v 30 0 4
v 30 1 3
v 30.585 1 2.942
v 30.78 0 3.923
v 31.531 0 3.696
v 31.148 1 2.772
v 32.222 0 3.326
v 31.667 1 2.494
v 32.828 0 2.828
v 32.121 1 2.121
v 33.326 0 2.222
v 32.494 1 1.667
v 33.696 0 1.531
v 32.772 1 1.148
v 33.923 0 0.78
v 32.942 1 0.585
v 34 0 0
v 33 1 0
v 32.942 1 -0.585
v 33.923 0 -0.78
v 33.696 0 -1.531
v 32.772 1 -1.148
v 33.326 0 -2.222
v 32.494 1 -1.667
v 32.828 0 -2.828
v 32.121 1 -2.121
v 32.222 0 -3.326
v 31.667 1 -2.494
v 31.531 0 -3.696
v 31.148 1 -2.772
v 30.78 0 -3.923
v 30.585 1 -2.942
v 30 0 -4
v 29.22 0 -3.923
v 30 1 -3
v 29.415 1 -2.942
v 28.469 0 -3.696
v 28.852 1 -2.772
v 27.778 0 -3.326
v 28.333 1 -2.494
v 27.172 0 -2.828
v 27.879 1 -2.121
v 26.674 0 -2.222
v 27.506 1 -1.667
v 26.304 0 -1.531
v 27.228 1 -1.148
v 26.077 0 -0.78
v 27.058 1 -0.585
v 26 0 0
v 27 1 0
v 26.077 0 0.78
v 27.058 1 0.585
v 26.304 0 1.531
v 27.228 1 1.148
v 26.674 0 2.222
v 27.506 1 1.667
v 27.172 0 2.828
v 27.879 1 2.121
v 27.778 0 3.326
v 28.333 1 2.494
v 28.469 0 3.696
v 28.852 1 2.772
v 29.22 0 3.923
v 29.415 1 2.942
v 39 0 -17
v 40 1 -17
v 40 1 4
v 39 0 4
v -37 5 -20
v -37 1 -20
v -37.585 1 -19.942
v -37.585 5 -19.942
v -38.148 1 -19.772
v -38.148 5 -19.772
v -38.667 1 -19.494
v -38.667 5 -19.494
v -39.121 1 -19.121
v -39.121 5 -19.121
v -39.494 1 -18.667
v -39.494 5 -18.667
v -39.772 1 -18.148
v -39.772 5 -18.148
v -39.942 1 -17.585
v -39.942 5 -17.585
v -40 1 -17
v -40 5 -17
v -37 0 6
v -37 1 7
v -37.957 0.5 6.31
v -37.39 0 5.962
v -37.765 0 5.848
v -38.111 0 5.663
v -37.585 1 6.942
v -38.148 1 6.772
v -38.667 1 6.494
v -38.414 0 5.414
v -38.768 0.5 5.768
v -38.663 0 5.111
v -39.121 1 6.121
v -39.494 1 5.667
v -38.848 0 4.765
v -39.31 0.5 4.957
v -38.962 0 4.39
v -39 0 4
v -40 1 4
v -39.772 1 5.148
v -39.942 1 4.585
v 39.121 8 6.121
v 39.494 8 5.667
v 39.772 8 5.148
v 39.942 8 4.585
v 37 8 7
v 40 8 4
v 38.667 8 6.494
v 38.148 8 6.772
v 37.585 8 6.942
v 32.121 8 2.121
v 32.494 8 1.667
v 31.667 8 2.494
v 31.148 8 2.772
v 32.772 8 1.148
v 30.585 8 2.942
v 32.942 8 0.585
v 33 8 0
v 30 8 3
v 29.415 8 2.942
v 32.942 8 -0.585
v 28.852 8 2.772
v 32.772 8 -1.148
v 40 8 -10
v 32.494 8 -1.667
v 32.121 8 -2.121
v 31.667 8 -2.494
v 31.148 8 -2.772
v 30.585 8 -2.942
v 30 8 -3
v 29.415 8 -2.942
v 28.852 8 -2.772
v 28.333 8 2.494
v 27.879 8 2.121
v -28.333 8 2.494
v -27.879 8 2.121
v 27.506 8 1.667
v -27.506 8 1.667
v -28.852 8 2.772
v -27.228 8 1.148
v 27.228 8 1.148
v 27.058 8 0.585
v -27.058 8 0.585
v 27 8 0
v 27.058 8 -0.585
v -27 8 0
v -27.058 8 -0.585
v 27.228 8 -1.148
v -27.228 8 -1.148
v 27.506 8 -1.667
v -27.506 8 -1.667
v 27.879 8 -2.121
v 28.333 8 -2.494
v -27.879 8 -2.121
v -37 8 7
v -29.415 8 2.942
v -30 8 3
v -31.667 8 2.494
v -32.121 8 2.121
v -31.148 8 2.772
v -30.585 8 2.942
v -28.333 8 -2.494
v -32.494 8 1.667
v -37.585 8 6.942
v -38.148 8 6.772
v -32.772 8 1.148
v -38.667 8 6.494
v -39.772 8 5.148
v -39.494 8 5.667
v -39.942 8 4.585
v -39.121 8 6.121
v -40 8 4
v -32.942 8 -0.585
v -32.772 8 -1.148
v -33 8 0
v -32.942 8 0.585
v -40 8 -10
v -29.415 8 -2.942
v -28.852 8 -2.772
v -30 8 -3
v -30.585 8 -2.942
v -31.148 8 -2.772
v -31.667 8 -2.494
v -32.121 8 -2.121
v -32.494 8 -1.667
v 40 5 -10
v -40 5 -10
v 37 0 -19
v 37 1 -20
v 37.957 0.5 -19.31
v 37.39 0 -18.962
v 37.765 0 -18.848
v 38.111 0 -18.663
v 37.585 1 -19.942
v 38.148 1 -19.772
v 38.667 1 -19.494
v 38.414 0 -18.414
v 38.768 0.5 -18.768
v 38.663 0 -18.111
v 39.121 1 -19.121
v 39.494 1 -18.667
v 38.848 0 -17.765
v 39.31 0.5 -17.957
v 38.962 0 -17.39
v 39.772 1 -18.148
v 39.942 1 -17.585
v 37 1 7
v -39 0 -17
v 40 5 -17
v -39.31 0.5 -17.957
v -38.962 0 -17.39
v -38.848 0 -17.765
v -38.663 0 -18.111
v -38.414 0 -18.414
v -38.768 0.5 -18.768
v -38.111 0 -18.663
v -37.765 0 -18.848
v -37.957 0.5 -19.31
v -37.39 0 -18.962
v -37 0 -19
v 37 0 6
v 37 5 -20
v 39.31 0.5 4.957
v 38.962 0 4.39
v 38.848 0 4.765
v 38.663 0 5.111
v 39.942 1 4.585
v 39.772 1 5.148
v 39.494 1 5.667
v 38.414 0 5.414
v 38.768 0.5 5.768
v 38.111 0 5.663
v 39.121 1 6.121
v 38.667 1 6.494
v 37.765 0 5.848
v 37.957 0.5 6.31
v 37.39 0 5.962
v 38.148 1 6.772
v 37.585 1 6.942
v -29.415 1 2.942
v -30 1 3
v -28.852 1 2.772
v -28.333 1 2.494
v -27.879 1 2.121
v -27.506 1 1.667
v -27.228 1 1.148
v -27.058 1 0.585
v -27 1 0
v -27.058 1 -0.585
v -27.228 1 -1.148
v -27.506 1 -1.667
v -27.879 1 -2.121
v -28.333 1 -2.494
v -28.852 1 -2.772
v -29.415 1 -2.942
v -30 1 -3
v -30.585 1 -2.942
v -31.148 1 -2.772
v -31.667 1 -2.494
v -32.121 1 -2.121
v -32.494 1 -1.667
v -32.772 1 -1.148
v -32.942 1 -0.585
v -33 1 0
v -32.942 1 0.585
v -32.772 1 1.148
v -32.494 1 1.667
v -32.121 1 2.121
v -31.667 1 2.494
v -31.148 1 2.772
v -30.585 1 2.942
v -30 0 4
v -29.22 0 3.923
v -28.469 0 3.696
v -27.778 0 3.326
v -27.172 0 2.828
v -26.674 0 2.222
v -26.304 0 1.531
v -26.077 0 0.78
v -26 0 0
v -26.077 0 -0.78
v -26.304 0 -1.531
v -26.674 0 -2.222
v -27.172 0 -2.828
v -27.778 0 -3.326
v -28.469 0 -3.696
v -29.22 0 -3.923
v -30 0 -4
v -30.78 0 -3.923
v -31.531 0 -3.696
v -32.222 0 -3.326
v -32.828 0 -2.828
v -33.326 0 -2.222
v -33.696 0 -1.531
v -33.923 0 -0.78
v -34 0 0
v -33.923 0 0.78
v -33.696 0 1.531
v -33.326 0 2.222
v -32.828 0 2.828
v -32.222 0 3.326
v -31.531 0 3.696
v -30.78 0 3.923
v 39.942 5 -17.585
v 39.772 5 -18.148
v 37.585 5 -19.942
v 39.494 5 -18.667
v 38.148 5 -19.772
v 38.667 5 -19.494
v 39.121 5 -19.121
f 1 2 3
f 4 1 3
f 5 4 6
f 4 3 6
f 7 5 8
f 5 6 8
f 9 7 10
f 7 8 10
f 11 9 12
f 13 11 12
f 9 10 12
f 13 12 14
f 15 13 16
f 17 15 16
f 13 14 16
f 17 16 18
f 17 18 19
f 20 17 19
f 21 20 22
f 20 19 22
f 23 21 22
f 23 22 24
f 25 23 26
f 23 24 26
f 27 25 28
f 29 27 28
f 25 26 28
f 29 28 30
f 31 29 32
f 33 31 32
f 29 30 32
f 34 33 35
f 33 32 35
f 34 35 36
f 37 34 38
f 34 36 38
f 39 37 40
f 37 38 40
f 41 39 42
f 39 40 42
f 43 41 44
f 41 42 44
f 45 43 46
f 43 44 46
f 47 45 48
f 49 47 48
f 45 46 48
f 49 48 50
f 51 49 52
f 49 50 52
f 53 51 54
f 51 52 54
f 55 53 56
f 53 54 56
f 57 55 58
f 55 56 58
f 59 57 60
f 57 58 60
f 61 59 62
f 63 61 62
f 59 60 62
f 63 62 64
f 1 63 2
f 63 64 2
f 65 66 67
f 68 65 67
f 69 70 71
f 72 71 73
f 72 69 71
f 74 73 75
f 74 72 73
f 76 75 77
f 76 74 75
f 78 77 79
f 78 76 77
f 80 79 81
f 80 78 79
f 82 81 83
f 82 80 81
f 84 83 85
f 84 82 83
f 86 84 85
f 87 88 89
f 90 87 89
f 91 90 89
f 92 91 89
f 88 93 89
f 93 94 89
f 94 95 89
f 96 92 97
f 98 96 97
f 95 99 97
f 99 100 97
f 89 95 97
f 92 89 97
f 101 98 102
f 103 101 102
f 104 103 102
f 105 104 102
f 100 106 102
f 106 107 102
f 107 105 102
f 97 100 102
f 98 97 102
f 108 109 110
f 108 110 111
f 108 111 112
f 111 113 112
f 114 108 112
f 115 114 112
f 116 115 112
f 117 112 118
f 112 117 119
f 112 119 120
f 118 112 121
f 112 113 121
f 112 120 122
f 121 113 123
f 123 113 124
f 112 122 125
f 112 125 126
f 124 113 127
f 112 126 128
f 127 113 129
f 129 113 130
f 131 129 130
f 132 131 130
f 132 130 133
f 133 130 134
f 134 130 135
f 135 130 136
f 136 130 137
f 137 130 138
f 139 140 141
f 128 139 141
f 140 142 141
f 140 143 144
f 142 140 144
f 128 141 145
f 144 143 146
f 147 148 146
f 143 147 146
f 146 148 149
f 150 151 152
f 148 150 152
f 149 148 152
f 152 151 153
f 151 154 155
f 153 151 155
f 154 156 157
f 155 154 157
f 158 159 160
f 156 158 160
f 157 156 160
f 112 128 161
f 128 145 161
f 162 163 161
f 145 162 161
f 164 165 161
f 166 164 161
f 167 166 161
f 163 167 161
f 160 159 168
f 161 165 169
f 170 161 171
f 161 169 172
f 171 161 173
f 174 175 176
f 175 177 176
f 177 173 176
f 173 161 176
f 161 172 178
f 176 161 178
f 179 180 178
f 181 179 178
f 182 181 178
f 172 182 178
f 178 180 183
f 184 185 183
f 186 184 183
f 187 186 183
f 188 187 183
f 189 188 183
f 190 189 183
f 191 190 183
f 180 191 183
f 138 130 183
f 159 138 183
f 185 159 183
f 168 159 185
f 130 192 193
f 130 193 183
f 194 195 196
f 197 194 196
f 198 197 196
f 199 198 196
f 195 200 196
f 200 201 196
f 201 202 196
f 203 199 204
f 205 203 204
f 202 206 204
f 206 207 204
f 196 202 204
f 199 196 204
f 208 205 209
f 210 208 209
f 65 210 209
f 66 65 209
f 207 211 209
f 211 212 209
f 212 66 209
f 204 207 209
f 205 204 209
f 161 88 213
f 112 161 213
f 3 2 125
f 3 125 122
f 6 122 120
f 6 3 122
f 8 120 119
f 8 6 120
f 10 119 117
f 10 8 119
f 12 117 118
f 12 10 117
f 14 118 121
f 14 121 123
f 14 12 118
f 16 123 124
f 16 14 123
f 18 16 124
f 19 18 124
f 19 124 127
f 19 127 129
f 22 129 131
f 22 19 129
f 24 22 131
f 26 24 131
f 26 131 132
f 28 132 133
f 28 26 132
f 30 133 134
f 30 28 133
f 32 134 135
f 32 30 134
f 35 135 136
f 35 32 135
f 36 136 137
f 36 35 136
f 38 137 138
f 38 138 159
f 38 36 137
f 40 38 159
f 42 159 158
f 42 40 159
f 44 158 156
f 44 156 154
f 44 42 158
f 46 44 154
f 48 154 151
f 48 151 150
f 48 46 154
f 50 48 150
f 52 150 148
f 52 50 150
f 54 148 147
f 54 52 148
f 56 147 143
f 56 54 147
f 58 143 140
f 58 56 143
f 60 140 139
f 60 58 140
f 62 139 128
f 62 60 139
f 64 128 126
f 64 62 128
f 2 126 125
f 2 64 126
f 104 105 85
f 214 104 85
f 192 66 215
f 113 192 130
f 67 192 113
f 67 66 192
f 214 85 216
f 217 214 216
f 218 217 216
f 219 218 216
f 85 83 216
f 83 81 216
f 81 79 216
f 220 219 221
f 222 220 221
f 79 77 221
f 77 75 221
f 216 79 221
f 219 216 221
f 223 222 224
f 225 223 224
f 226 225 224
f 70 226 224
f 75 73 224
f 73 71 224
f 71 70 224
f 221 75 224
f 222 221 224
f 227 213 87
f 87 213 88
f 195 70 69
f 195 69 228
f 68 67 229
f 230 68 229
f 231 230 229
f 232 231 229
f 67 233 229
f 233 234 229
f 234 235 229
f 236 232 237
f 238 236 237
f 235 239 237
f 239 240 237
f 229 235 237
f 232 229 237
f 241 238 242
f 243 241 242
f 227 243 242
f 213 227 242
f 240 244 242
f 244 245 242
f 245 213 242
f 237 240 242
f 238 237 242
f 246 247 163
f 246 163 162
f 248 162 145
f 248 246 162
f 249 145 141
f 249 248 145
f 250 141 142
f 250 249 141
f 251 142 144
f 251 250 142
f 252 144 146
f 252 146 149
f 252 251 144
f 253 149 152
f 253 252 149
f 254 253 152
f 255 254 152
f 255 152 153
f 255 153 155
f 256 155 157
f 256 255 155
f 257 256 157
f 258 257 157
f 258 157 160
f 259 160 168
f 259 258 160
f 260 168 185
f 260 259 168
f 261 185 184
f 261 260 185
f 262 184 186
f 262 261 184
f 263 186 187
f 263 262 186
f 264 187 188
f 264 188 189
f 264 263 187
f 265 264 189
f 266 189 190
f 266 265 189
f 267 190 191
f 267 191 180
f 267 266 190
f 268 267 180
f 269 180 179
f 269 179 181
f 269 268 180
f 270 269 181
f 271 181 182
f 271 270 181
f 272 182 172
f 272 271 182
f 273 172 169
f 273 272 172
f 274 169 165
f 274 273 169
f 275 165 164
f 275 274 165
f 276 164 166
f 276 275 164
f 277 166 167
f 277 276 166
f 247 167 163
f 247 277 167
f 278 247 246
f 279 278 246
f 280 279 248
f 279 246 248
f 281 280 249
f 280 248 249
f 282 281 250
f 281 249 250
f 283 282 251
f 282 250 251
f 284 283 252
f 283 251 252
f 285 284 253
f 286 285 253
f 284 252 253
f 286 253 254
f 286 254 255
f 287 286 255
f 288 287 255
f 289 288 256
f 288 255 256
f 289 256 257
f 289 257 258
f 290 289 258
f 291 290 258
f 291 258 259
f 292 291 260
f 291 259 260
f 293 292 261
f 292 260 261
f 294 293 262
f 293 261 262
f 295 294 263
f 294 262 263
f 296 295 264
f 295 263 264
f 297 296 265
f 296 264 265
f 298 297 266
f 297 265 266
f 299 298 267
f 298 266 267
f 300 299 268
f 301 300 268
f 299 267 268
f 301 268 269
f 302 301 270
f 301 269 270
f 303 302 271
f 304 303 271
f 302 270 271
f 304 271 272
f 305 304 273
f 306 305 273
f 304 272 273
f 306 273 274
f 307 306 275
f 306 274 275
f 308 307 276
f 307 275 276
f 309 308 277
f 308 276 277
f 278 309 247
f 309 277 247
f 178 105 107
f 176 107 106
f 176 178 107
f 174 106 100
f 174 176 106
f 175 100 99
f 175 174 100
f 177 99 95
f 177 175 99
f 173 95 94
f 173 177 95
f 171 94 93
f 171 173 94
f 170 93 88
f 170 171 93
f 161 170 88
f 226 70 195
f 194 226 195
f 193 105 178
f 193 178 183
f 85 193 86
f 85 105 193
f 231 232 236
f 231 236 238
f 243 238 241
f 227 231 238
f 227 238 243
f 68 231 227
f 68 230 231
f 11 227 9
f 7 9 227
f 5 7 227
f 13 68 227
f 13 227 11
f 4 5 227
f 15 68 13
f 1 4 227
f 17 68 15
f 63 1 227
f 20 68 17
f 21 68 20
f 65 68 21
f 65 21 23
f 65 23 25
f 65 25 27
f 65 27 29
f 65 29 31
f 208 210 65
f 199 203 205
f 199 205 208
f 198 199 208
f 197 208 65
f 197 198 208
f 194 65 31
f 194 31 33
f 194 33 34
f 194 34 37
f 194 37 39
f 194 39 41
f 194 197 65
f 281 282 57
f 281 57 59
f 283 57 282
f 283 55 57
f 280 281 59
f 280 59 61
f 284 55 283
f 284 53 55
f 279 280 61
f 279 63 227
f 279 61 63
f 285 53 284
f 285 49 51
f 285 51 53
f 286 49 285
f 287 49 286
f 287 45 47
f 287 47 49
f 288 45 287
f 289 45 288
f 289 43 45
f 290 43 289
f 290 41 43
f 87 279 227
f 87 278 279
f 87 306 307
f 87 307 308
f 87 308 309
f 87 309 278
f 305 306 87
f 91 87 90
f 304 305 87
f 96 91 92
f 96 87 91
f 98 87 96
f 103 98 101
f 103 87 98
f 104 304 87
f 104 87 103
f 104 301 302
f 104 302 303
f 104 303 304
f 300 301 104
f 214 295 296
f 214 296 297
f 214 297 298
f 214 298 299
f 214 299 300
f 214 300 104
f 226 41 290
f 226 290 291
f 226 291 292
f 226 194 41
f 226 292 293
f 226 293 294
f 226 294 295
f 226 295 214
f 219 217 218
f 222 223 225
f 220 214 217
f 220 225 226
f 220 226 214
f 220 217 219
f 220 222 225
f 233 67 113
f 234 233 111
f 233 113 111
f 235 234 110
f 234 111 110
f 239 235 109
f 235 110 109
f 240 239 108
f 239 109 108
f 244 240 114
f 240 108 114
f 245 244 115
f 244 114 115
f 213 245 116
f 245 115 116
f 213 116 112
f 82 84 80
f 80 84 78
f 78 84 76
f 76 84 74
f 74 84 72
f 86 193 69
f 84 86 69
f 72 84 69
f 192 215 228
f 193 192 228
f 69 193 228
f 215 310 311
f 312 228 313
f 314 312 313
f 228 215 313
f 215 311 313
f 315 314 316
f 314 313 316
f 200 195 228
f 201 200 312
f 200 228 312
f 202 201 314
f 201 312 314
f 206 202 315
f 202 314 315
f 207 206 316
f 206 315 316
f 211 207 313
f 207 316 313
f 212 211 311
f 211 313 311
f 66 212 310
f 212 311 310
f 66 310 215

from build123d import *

# Parameters (mm, degrees)
SKETCH1_R           = 3
BOSS_EXTRUDE1_DEPTH = 8
SKETCH2_W           = 10
SKETCH2_H           = 3
CUT_EXTRUDE1_DEPTH  = 83.849260709
FILLET1_R           = 3
CHAMFER1_SIZE       = 1


with BuildPart() as part:
    # Sketch1 → Boss-Extrude1 (new body)
    with BuildSketch(Plane(origin=(0, 0, 0), x_dir=(1, 0, 0), z_dir=(0, 1, 0))):
        Polygon((-40, 20), (40, 20), (40, -7), (30, -7), (-40, -7), align=None)
        with Locations(Location((30, 0, 0), (0, 0, 270))):
            Circle(SKETCH1_R, mode=Mode.SUBTRACT)
        with Locations(Location((-30, 0, 0), (0, 0, 270))):
            Circle(SKETCH1_R, mode=Mode.SUBTRACT)
    extrude(amount=BOSS_EXTRUDE1_DEPTH)

    # Sketch2 → Cut-Extrude1 (cut, through all)
    with BuildSketch(Plane(origin=(40, 0, 0), x_dir=(0, 0, -1), z_dir=(1, 0, 0))):
        with Locations((15, 6.5)):
            Rectangle(SKETCH2_W, SKETCH2_H)
    extrude(amount=-CUT_EXTRUDE1_DEPTH, mode=Mode.SUBTRACT)

    # Fillet1
    fillet1_edges = [part.edges().sort_by_distance(p)[0] for p in [
        (-40, 4, 7),
        (40, 4, 7),
        (-40, 2.5, -20),
        (40, 2.5, -20),
    ]]
    fillet(fillet1_edges, radius=FILLET1_R)

    # Chamfer1
    chamfer1_edges = [part.edges().sort_by_distance(p)[0] for p in [
        (-40, 0, -6.5),
        (0, 0, 7),
        (0, 0, -20),
        (40, 0, -6.5),
        (39.121320344, 0, -19.121320344),
        (39.121320344, 0, 6.121320344),
        (-39.121320344, 0, 6.121320344),
        (-39.121320344, 0, -19.121320344),
        (-30, 0, -3),
        (30, 0, -3),
    ]]
    chamfer(chamfer1_edges, length=CHAMFER1_SIZE)


solid = part.part
